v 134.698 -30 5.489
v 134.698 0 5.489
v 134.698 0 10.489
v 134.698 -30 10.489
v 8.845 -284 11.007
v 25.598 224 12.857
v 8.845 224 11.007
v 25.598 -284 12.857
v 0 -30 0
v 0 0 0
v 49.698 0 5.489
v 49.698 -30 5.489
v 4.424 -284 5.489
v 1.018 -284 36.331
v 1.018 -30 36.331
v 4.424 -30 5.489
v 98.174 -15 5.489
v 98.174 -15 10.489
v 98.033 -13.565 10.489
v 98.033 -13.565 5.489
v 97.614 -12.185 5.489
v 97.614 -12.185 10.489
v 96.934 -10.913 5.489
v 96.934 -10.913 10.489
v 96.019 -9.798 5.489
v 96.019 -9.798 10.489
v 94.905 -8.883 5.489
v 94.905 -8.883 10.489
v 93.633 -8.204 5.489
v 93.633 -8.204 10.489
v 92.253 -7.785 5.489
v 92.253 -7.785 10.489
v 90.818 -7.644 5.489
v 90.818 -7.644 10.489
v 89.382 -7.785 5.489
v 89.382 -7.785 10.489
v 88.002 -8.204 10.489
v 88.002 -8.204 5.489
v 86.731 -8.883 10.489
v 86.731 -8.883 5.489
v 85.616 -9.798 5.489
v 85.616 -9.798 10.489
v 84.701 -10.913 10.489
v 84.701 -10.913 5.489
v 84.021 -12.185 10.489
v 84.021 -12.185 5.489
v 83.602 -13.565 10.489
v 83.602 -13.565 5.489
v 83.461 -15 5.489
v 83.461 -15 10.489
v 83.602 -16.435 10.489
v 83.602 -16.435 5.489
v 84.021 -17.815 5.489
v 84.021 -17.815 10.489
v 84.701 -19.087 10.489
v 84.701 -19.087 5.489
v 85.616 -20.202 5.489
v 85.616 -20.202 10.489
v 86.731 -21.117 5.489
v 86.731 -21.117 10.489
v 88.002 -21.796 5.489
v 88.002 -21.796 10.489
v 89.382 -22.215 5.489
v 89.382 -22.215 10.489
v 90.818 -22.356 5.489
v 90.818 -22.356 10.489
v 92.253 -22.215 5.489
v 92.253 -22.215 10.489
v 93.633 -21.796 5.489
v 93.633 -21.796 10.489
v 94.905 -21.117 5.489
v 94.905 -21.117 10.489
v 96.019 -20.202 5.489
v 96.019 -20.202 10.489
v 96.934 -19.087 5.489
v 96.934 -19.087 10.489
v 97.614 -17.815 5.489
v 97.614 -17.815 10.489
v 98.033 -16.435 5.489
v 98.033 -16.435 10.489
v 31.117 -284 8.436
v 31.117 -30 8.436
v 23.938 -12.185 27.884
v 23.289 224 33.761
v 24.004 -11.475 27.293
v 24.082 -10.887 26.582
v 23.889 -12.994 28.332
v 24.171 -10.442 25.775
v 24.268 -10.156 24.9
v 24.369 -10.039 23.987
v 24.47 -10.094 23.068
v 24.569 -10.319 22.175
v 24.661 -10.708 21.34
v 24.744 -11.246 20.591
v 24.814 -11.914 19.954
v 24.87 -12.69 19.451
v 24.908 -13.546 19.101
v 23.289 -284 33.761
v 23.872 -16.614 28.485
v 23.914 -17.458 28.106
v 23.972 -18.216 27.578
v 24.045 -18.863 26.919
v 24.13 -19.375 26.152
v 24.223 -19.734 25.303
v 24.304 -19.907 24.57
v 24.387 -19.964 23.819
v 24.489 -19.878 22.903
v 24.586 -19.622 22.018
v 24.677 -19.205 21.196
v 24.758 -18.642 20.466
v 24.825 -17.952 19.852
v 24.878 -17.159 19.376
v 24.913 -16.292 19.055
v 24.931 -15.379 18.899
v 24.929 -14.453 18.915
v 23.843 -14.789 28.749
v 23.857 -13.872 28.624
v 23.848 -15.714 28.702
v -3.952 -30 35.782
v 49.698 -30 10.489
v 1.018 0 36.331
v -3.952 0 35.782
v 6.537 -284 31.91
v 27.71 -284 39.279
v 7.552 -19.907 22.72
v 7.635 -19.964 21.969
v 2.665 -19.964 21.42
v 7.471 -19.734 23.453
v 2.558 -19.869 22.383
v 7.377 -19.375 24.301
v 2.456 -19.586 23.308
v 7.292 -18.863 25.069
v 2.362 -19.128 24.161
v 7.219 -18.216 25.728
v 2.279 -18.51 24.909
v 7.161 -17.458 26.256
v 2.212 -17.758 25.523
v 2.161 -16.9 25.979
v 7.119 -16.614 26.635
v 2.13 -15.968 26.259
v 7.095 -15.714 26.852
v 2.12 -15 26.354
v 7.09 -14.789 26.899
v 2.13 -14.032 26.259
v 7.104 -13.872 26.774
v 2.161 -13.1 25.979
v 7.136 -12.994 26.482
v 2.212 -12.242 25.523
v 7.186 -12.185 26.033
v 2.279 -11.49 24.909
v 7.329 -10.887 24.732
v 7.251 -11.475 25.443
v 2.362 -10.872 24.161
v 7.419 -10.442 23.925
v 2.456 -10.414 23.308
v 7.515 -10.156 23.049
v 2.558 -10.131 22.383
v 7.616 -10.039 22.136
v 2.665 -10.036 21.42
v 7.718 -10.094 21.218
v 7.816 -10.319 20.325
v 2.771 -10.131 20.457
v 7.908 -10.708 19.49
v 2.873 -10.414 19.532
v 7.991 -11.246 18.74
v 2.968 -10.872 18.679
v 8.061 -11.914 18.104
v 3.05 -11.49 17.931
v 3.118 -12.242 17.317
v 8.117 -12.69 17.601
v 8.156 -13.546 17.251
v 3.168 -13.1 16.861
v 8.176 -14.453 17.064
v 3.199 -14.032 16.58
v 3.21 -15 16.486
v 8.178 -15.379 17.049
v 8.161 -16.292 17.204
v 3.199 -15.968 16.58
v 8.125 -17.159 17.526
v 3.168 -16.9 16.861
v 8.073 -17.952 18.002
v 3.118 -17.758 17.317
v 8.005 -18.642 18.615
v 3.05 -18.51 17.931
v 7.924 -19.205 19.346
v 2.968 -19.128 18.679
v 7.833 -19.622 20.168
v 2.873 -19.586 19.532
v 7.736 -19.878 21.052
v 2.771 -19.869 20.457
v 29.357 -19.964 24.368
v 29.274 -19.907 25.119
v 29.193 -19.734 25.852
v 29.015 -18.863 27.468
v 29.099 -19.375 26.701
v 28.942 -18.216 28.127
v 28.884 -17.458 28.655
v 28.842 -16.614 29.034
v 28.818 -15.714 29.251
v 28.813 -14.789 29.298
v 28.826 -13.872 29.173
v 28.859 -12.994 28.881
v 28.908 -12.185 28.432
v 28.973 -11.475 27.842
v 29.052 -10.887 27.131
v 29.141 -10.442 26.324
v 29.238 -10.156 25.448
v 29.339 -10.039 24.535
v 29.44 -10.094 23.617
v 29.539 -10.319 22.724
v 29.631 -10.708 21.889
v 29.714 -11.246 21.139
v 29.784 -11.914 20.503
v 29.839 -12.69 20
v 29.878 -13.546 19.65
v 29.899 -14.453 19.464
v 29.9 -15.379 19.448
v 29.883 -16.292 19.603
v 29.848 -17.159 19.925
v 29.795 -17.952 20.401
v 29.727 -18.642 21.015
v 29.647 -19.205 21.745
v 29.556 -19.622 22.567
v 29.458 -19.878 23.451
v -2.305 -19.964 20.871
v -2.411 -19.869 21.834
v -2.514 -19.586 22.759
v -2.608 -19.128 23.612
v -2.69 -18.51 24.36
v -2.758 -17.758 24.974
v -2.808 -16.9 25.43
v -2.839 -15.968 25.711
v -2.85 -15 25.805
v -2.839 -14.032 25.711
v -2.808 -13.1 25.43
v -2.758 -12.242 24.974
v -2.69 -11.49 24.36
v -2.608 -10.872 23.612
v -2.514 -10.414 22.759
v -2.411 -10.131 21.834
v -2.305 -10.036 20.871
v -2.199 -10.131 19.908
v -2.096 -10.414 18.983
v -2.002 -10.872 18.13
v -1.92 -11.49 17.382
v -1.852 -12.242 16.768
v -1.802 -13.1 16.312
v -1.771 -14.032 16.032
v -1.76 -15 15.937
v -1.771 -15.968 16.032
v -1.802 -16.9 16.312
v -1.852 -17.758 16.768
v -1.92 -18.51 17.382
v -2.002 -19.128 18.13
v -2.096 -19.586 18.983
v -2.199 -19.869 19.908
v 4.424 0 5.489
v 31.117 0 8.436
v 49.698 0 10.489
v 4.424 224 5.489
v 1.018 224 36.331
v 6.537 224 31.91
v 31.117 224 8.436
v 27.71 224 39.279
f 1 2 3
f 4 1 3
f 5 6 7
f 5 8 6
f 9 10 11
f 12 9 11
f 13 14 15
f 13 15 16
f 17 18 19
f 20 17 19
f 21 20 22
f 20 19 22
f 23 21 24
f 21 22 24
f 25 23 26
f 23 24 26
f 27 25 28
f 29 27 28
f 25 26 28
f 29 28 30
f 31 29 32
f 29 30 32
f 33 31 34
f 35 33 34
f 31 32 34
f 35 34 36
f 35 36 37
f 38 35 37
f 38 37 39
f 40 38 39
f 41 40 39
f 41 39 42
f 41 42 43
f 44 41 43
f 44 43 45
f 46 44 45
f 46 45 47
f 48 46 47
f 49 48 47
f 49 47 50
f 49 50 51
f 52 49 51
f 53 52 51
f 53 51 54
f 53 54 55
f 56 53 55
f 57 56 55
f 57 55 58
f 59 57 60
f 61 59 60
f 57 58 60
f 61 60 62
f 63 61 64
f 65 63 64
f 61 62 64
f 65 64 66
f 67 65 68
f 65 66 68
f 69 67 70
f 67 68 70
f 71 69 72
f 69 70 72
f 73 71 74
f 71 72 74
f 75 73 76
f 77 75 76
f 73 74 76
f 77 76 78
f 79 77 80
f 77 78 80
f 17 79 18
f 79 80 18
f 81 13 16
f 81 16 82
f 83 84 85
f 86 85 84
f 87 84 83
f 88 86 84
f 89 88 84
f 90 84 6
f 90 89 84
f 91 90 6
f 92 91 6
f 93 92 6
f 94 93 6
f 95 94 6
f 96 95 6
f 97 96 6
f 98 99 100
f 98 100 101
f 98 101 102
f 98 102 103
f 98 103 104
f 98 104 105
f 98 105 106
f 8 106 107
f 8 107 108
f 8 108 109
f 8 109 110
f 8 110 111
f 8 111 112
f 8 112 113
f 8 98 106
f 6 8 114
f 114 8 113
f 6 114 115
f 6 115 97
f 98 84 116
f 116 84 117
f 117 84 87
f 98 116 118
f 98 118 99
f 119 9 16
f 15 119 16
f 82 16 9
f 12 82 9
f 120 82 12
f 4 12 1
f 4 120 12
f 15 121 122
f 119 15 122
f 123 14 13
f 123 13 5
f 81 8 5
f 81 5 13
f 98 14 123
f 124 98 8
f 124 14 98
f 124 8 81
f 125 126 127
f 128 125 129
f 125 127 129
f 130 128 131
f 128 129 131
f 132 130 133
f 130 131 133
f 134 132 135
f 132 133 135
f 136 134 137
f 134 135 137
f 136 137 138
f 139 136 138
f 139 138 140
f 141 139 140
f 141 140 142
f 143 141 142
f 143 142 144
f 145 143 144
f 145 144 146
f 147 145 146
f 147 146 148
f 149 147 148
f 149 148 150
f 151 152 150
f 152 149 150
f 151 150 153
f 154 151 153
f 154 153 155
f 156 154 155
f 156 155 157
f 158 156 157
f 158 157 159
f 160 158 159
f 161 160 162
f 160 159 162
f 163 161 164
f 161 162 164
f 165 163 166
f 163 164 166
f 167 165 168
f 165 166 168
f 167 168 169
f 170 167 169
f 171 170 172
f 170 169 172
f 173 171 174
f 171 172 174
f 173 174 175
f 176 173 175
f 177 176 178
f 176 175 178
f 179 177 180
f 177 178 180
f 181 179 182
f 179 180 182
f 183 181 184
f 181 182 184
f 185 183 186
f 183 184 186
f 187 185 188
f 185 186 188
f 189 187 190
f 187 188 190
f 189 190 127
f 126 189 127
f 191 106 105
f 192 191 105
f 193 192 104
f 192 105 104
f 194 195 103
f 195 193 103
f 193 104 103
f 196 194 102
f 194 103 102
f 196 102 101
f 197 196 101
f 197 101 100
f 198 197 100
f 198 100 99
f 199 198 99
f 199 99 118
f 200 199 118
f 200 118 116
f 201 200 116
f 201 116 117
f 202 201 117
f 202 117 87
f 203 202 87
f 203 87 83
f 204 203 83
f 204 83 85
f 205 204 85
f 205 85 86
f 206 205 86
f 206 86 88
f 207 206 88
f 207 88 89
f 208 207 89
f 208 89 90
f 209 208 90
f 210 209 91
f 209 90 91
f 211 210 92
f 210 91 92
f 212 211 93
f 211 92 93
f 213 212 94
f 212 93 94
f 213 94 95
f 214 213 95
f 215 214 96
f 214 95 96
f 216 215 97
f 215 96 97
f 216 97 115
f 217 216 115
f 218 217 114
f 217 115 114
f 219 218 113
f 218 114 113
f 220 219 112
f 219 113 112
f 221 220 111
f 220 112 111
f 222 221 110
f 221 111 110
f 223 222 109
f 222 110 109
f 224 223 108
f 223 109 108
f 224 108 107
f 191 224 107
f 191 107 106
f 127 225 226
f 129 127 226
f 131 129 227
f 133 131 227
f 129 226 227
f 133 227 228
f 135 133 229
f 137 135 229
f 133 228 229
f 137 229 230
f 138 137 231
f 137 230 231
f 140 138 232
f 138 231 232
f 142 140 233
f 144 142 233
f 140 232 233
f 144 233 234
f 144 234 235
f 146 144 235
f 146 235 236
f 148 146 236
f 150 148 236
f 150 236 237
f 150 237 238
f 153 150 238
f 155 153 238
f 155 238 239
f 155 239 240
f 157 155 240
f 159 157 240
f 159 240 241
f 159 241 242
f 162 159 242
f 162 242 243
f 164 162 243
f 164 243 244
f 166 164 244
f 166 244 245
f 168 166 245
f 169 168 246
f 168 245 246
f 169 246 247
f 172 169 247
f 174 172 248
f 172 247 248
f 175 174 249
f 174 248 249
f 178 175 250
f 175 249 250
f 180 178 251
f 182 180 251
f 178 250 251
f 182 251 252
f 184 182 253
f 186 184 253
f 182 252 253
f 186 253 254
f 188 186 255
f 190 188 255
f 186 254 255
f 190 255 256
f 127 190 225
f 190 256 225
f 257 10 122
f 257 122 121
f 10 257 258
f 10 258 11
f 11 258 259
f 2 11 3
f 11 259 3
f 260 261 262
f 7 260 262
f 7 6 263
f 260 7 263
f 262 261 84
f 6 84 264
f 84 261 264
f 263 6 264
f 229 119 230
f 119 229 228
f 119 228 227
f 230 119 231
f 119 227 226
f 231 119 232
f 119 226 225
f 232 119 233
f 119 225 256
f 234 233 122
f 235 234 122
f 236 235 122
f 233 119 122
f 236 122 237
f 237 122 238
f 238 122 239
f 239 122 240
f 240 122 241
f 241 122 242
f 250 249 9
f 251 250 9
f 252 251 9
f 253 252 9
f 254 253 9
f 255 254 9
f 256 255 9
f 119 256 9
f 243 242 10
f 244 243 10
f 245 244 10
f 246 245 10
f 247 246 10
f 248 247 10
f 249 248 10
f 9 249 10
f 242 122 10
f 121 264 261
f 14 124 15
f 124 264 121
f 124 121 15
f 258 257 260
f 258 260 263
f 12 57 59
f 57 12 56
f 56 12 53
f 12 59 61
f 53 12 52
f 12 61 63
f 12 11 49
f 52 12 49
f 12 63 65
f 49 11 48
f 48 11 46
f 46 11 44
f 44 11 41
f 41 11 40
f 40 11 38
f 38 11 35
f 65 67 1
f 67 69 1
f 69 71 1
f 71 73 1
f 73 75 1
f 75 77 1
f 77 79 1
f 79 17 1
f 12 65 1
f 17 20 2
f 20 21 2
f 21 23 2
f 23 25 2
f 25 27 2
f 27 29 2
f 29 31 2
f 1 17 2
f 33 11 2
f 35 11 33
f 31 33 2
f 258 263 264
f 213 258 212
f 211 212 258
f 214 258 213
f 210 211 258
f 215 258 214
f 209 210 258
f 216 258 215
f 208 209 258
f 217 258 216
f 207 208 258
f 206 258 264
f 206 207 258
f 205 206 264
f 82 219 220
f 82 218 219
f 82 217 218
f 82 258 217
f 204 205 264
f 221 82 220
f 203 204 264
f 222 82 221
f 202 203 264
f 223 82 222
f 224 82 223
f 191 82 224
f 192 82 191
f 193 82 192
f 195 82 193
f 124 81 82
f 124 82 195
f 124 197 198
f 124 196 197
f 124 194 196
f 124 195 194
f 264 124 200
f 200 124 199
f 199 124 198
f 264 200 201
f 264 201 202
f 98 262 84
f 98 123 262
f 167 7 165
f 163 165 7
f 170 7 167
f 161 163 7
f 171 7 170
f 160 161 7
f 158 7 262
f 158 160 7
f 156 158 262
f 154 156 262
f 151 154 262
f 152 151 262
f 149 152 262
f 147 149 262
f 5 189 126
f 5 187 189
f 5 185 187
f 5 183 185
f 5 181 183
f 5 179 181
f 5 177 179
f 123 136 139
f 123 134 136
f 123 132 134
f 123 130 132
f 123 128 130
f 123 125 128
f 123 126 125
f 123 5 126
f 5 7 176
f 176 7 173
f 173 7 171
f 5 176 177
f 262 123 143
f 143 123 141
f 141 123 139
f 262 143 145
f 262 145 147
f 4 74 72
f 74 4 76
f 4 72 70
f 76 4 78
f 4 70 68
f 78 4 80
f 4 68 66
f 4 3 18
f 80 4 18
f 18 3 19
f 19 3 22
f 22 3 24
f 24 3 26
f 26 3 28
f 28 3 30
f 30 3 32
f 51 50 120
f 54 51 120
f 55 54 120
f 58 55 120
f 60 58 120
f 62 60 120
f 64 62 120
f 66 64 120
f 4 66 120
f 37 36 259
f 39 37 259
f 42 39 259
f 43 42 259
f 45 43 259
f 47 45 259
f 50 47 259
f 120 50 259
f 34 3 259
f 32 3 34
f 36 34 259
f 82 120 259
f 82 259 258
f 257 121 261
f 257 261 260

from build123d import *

# Parameters (mm, degrees)
F1_DEPTH = 30
F2_R     = 7.3564369941
F3_DEPTH = 10.4896114323
F4_R     = 4.9643455943
F5_DEPTH = 137.8729965196
F7_DEPTH = 254
F8_DEPTH = 133.196592753


with BuildPart() as f1:
    # F0 (on Front) → F1 (new body)
    with BuildSketch(Plane.XZ):
        Polygon((1.0179836117, 36.3313048123), (-3.9518002313, 35.7824436691), (0, 0), (49.6978384293, 5.4886114323), (134.6978384293, 5.4886114323), (134.6978384293, 10.4886114323), (49.6978384293, 10.4886114323), (4.4242395946, 5.4886114323), align=None)
    extrude(amount=F1_DEPTH)

    # F2 (on face) → F3 (cut, through all)
    with BuildSketch(Plane.XY.offset(10.4886114323)):
        with Locations((90.8175626415, -15)):
            Circle(F2_R)
    extrude(amount=-F3_DEPTH, mode=Mode.SUBTRACT)

    # F4 (on face) → F5 (cut, through all)
    with BuildSketch(Plane(origin=(0, 0, 0), x_dir=(0, -1, 0), z_dir=(-0.9939567686, 0, -0.1097722286))):
        with Locations((15, 20.9979638457)):
            Circle(F4_R)
    extrude(amount=-F5_DEPTH, mode=Mode.SUBTRACT)

    # F6 (on face) → F7 (join, symmetric)
    with BuildSketch(Plane.XZ.offset(30)):
        Polygon((27.710283177, 39.2791927926), (1.0179836117, 36.3313048123), (4.4242395946, 5.4886114323), (31.1165391599, 8.4364994126), align=None)
        Polygon((8.8451622943, 11.0072564185), (6.5366285978, 31.9103821126), (23.2893604773, 33.7605478064), (25.5978941738, 12.8574221123), align=None, mode=Mode.SUBTRACT)
    extrude(amount=F7_DEPTH, both=True)

    # F8 (cut, through all): a face of the model
    f8_faces = [f1.faces().sort_by_distance(p)[0] for p in [
        (2.6647905545, -15, 21.4199294342),
    ]]
    extrude(f8_faces, amount=-F8_DEPTH, mode=Mode.SUBTRACT)


solid = f1.part
